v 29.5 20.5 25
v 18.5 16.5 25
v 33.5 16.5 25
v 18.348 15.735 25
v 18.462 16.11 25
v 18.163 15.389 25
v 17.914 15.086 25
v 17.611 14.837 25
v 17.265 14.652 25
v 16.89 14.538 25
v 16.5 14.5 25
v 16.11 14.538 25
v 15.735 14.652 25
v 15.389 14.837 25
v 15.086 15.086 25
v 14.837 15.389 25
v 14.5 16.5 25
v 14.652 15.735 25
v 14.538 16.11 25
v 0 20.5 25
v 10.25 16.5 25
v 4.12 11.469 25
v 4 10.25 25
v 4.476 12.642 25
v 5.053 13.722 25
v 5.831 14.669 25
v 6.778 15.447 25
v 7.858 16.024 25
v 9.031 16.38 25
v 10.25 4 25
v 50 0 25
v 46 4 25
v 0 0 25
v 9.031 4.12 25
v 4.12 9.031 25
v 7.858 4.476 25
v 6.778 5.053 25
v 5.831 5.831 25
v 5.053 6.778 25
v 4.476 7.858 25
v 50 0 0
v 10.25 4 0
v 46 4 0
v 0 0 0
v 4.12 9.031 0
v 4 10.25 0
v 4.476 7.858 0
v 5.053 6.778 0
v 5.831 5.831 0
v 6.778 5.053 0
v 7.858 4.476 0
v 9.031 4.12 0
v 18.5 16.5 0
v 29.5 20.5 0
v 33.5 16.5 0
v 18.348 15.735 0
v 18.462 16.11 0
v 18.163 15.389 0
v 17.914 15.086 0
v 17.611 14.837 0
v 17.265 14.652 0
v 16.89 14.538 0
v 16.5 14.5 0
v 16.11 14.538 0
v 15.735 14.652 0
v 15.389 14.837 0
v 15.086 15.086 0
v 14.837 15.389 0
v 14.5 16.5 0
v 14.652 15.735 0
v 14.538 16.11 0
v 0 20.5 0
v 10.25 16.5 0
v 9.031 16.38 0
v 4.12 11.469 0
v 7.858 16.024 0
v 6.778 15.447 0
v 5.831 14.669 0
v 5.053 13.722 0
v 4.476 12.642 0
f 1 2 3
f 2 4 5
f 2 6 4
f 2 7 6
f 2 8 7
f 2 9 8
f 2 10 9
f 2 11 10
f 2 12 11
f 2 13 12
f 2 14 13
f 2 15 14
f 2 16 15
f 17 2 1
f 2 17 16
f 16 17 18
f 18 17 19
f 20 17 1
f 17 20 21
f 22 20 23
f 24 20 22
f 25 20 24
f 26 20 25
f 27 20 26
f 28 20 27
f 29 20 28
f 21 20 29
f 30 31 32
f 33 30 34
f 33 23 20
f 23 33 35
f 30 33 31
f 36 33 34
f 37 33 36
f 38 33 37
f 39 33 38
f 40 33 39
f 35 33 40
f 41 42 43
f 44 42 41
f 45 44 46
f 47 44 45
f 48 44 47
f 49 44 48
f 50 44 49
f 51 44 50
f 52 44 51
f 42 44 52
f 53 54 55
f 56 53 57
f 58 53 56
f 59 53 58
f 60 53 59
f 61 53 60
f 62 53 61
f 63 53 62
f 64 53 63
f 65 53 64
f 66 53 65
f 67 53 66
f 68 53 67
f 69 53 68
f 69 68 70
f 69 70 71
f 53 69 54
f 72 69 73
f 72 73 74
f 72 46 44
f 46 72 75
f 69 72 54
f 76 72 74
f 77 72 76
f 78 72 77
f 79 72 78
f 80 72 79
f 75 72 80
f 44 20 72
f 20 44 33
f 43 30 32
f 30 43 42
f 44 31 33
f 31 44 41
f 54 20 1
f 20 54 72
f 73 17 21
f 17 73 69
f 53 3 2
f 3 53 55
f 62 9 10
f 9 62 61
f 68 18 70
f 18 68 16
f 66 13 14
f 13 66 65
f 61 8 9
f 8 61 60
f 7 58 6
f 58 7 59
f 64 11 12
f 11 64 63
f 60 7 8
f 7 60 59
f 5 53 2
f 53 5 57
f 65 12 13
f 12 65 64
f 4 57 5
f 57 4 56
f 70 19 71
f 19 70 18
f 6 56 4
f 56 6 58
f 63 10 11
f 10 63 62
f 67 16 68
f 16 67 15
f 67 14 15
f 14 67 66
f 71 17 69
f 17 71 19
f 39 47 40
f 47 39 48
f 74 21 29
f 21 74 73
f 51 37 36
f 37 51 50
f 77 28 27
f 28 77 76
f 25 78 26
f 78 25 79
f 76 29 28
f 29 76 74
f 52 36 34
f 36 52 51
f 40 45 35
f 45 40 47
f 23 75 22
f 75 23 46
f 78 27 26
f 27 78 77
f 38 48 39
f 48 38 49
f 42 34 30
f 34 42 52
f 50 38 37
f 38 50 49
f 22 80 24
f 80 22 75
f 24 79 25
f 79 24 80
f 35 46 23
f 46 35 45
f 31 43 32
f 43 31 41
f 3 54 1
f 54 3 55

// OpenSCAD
// How wide should the clip be?
clipWidth = 25;

// How high should the clip be?
clipHeight = 50;

// How thick should the walls be?
plateThickness = 4;

// What diameter bar is the clip clipping onto?
barSize = 12.5;

// How big of a "nub"? (for snapping on/off)
nubSize = 2;

difference() {
    union() {
        // plate
        cube([clipHeight, plateThickness, clipWidth]);

        // top of clip
        cube([(plateThickness + (barSize/2)), (plateThickness * 2 + barSize), clipWidth]);

        // inside of clip
        translate([0, barSize + plateThickness, 0])
            cube([clipHeight, plateThickness, clipWidth]);
        translate([plateThickness + barSize, barSize + plateThickness, 0])
            cylinder($fn=32, h=clipWidth, r=nubSize);
    }

    translate([plateThickness + (barSize/2), plateThickness + (barSize/2), -1])
        cylinder($fn=32, h=(clipWidth + 2), d=barSize);
    translate([clipHeight, 0, -1])
        rotate(a=[0, 0, 45])
        cube([clipHeight, clipHeight, clipWidth+2]);
}
